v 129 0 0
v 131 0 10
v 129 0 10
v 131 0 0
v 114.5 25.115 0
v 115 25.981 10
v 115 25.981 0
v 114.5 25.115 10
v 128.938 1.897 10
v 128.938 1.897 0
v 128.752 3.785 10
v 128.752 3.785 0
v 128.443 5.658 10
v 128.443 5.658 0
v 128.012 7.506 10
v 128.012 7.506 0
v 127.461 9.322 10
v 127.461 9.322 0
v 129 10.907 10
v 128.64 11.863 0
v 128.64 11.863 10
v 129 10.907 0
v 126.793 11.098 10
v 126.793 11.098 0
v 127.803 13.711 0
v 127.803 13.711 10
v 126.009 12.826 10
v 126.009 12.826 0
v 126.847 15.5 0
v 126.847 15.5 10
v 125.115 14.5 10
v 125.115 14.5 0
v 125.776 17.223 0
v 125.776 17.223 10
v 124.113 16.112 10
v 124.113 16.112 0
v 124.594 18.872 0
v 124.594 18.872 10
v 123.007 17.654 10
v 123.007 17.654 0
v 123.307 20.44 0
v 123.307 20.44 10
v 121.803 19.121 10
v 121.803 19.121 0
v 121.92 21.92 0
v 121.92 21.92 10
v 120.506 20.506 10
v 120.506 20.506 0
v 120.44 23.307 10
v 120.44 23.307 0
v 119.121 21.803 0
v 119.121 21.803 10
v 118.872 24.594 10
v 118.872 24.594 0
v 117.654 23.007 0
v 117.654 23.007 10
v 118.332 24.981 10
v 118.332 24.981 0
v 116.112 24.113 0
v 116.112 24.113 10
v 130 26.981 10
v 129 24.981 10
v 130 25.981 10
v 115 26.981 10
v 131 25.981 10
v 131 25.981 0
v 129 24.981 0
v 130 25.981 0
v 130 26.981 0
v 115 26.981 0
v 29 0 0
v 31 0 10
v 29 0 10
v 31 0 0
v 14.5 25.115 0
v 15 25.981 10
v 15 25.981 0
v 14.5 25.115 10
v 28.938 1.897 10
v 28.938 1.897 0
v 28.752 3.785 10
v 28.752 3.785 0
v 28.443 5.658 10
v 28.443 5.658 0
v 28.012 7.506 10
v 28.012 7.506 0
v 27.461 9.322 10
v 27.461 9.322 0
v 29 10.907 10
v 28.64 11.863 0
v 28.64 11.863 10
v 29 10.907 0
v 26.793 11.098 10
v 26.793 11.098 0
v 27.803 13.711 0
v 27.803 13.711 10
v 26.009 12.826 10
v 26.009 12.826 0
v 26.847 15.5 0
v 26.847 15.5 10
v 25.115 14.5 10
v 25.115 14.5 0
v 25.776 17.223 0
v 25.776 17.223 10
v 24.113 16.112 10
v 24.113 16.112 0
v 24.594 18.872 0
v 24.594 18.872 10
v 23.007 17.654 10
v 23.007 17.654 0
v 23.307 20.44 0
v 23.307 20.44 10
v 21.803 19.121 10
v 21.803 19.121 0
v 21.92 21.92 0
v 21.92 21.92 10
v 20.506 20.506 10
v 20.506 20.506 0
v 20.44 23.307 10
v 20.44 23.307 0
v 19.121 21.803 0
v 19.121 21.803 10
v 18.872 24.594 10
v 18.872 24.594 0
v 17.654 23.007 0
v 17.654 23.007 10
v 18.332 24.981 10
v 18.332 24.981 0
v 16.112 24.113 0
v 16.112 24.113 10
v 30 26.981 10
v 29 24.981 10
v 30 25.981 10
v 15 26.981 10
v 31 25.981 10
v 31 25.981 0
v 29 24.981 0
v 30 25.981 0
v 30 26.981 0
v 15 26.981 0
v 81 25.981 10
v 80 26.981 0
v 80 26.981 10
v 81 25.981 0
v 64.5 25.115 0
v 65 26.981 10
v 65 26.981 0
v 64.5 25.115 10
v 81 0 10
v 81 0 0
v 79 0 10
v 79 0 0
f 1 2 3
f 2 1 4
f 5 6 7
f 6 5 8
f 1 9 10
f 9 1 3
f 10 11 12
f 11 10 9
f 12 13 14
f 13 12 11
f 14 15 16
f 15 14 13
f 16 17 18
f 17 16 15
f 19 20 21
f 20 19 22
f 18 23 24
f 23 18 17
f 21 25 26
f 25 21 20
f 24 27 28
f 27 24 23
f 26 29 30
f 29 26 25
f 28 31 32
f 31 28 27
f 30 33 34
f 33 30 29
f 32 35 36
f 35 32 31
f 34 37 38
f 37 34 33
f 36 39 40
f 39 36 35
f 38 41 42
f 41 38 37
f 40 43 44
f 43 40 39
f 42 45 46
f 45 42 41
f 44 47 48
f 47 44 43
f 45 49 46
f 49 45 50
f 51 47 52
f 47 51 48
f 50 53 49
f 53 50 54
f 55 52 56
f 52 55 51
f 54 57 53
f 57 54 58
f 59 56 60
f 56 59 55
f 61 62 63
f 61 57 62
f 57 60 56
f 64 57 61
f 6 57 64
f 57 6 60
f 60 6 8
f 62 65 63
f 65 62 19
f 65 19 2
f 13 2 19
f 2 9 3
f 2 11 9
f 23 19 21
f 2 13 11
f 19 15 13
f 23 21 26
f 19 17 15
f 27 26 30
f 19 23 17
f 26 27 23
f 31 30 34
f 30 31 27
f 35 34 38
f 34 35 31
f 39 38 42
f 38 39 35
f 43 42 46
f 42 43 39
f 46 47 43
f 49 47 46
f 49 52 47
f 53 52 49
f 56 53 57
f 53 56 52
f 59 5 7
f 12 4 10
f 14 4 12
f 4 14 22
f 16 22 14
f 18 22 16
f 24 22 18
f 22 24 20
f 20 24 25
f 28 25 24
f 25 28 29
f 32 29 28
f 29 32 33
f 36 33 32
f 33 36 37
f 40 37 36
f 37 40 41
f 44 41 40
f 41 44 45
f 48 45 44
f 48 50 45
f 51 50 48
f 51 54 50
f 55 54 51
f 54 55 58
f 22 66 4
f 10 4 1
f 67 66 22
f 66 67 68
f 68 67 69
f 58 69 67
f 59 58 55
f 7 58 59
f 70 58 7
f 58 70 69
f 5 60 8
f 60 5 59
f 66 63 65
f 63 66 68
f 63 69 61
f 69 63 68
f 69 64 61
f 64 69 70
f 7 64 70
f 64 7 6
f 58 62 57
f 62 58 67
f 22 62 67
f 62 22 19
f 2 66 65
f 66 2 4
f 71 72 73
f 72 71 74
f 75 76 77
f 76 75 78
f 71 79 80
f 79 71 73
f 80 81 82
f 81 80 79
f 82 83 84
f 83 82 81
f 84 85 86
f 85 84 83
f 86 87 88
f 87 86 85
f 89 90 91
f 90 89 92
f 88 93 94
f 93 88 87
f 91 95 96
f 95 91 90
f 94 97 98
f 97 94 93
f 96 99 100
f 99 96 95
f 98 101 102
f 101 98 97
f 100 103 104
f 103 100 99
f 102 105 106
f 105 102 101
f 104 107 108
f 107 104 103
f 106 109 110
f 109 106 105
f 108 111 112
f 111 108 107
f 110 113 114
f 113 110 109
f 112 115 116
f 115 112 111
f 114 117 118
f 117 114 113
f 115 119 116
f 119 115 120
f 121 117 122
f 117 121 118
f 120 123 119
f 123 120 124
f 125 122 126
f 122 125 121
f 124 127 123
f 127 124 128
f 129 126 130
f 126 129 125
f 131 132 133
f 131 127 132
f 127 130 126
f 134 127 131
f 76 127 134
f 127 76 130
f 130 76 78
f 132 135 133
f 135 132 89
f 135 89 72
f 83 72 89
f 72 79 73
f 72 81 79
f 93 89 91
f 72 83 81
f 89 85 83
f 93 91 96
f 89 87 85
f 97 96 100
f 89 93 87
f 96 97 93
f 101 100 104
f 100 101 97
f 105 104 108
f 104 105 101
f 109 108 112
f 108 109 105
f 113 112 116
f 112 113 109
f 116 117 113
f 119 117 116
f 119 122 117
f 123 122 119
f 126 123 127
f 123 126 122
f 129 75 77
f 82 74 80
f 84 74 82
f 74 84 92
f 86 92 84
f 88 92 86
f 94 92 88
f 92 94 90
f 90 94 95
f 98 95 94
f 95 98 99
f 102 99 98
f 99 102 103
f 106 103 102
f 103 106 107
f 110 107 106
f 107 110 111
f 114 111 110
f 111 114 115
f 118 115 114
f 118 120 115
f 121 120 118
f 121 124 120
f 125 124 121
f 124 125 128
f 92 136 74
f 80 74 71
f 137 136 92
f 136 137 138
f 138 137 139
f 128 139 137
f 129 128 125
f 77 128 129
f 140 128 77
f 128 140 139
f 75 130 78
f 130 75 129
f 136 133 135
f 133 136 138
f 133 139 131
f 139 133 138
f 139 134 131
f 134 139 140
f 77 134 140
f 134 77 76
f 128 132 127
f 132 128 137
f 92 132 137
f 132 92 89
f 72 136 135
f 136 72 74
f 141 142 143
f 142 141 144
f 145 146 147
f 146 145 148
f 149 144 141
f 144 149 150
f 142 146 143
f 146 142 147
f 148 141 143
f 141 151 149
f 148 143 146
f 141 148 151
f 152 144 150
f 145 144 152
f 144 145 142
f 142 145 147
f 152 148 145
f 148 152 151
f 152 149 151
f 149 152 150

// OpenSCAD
$fn= 100;

width = 10;   // width of rectangle
height = 2;   // height of rectangle
r = 30;       // radius of the curve
a = 60;       // angle of the curve

x = r * cos(a);
y = r * sin(a);

translate([0, 0, width/2]) rotate_extrude(angle = a) translate([r, 0, 0]) square(size = [height, width], center = true);
linear_extrude(height=width) {
    translate([r,y/2,0]) square(size = [height, y], center = true);
    translate([x+(r-x)/2,y,0]) square(size = [r-x, height], center = true);
}


translate([50,0,0]) 
hull() {
    translate([0, 0, width/2]) rotate_extrude(angle = a) translate([r, 0, 0]) square(size = [height, width], center = true);
    linear_extrude(height=width) {
        translate([r,y/2,0]) square(size = [height, y], center = true);
        translate([x+(r-x)/2,y,0]) square(size = [r-x, height], center = true);
    }
}

translate([100,0,0])
// minkowski() {
    union() {
        translate([0, 0, width/2]) rotate_extrude(angle = a) translate([r, 0, 0]) square(size = [height, width], center = true);
        linear_extrude(height=width) {
            translate([r,y/2,0]) square(size = [height, y], center = true);
            translate([x+(r-x)/2,y,0]) square(size = [r-x, height], center = true);
        }
    }
    
//     sphere(d=3, $fn=30);
// }
